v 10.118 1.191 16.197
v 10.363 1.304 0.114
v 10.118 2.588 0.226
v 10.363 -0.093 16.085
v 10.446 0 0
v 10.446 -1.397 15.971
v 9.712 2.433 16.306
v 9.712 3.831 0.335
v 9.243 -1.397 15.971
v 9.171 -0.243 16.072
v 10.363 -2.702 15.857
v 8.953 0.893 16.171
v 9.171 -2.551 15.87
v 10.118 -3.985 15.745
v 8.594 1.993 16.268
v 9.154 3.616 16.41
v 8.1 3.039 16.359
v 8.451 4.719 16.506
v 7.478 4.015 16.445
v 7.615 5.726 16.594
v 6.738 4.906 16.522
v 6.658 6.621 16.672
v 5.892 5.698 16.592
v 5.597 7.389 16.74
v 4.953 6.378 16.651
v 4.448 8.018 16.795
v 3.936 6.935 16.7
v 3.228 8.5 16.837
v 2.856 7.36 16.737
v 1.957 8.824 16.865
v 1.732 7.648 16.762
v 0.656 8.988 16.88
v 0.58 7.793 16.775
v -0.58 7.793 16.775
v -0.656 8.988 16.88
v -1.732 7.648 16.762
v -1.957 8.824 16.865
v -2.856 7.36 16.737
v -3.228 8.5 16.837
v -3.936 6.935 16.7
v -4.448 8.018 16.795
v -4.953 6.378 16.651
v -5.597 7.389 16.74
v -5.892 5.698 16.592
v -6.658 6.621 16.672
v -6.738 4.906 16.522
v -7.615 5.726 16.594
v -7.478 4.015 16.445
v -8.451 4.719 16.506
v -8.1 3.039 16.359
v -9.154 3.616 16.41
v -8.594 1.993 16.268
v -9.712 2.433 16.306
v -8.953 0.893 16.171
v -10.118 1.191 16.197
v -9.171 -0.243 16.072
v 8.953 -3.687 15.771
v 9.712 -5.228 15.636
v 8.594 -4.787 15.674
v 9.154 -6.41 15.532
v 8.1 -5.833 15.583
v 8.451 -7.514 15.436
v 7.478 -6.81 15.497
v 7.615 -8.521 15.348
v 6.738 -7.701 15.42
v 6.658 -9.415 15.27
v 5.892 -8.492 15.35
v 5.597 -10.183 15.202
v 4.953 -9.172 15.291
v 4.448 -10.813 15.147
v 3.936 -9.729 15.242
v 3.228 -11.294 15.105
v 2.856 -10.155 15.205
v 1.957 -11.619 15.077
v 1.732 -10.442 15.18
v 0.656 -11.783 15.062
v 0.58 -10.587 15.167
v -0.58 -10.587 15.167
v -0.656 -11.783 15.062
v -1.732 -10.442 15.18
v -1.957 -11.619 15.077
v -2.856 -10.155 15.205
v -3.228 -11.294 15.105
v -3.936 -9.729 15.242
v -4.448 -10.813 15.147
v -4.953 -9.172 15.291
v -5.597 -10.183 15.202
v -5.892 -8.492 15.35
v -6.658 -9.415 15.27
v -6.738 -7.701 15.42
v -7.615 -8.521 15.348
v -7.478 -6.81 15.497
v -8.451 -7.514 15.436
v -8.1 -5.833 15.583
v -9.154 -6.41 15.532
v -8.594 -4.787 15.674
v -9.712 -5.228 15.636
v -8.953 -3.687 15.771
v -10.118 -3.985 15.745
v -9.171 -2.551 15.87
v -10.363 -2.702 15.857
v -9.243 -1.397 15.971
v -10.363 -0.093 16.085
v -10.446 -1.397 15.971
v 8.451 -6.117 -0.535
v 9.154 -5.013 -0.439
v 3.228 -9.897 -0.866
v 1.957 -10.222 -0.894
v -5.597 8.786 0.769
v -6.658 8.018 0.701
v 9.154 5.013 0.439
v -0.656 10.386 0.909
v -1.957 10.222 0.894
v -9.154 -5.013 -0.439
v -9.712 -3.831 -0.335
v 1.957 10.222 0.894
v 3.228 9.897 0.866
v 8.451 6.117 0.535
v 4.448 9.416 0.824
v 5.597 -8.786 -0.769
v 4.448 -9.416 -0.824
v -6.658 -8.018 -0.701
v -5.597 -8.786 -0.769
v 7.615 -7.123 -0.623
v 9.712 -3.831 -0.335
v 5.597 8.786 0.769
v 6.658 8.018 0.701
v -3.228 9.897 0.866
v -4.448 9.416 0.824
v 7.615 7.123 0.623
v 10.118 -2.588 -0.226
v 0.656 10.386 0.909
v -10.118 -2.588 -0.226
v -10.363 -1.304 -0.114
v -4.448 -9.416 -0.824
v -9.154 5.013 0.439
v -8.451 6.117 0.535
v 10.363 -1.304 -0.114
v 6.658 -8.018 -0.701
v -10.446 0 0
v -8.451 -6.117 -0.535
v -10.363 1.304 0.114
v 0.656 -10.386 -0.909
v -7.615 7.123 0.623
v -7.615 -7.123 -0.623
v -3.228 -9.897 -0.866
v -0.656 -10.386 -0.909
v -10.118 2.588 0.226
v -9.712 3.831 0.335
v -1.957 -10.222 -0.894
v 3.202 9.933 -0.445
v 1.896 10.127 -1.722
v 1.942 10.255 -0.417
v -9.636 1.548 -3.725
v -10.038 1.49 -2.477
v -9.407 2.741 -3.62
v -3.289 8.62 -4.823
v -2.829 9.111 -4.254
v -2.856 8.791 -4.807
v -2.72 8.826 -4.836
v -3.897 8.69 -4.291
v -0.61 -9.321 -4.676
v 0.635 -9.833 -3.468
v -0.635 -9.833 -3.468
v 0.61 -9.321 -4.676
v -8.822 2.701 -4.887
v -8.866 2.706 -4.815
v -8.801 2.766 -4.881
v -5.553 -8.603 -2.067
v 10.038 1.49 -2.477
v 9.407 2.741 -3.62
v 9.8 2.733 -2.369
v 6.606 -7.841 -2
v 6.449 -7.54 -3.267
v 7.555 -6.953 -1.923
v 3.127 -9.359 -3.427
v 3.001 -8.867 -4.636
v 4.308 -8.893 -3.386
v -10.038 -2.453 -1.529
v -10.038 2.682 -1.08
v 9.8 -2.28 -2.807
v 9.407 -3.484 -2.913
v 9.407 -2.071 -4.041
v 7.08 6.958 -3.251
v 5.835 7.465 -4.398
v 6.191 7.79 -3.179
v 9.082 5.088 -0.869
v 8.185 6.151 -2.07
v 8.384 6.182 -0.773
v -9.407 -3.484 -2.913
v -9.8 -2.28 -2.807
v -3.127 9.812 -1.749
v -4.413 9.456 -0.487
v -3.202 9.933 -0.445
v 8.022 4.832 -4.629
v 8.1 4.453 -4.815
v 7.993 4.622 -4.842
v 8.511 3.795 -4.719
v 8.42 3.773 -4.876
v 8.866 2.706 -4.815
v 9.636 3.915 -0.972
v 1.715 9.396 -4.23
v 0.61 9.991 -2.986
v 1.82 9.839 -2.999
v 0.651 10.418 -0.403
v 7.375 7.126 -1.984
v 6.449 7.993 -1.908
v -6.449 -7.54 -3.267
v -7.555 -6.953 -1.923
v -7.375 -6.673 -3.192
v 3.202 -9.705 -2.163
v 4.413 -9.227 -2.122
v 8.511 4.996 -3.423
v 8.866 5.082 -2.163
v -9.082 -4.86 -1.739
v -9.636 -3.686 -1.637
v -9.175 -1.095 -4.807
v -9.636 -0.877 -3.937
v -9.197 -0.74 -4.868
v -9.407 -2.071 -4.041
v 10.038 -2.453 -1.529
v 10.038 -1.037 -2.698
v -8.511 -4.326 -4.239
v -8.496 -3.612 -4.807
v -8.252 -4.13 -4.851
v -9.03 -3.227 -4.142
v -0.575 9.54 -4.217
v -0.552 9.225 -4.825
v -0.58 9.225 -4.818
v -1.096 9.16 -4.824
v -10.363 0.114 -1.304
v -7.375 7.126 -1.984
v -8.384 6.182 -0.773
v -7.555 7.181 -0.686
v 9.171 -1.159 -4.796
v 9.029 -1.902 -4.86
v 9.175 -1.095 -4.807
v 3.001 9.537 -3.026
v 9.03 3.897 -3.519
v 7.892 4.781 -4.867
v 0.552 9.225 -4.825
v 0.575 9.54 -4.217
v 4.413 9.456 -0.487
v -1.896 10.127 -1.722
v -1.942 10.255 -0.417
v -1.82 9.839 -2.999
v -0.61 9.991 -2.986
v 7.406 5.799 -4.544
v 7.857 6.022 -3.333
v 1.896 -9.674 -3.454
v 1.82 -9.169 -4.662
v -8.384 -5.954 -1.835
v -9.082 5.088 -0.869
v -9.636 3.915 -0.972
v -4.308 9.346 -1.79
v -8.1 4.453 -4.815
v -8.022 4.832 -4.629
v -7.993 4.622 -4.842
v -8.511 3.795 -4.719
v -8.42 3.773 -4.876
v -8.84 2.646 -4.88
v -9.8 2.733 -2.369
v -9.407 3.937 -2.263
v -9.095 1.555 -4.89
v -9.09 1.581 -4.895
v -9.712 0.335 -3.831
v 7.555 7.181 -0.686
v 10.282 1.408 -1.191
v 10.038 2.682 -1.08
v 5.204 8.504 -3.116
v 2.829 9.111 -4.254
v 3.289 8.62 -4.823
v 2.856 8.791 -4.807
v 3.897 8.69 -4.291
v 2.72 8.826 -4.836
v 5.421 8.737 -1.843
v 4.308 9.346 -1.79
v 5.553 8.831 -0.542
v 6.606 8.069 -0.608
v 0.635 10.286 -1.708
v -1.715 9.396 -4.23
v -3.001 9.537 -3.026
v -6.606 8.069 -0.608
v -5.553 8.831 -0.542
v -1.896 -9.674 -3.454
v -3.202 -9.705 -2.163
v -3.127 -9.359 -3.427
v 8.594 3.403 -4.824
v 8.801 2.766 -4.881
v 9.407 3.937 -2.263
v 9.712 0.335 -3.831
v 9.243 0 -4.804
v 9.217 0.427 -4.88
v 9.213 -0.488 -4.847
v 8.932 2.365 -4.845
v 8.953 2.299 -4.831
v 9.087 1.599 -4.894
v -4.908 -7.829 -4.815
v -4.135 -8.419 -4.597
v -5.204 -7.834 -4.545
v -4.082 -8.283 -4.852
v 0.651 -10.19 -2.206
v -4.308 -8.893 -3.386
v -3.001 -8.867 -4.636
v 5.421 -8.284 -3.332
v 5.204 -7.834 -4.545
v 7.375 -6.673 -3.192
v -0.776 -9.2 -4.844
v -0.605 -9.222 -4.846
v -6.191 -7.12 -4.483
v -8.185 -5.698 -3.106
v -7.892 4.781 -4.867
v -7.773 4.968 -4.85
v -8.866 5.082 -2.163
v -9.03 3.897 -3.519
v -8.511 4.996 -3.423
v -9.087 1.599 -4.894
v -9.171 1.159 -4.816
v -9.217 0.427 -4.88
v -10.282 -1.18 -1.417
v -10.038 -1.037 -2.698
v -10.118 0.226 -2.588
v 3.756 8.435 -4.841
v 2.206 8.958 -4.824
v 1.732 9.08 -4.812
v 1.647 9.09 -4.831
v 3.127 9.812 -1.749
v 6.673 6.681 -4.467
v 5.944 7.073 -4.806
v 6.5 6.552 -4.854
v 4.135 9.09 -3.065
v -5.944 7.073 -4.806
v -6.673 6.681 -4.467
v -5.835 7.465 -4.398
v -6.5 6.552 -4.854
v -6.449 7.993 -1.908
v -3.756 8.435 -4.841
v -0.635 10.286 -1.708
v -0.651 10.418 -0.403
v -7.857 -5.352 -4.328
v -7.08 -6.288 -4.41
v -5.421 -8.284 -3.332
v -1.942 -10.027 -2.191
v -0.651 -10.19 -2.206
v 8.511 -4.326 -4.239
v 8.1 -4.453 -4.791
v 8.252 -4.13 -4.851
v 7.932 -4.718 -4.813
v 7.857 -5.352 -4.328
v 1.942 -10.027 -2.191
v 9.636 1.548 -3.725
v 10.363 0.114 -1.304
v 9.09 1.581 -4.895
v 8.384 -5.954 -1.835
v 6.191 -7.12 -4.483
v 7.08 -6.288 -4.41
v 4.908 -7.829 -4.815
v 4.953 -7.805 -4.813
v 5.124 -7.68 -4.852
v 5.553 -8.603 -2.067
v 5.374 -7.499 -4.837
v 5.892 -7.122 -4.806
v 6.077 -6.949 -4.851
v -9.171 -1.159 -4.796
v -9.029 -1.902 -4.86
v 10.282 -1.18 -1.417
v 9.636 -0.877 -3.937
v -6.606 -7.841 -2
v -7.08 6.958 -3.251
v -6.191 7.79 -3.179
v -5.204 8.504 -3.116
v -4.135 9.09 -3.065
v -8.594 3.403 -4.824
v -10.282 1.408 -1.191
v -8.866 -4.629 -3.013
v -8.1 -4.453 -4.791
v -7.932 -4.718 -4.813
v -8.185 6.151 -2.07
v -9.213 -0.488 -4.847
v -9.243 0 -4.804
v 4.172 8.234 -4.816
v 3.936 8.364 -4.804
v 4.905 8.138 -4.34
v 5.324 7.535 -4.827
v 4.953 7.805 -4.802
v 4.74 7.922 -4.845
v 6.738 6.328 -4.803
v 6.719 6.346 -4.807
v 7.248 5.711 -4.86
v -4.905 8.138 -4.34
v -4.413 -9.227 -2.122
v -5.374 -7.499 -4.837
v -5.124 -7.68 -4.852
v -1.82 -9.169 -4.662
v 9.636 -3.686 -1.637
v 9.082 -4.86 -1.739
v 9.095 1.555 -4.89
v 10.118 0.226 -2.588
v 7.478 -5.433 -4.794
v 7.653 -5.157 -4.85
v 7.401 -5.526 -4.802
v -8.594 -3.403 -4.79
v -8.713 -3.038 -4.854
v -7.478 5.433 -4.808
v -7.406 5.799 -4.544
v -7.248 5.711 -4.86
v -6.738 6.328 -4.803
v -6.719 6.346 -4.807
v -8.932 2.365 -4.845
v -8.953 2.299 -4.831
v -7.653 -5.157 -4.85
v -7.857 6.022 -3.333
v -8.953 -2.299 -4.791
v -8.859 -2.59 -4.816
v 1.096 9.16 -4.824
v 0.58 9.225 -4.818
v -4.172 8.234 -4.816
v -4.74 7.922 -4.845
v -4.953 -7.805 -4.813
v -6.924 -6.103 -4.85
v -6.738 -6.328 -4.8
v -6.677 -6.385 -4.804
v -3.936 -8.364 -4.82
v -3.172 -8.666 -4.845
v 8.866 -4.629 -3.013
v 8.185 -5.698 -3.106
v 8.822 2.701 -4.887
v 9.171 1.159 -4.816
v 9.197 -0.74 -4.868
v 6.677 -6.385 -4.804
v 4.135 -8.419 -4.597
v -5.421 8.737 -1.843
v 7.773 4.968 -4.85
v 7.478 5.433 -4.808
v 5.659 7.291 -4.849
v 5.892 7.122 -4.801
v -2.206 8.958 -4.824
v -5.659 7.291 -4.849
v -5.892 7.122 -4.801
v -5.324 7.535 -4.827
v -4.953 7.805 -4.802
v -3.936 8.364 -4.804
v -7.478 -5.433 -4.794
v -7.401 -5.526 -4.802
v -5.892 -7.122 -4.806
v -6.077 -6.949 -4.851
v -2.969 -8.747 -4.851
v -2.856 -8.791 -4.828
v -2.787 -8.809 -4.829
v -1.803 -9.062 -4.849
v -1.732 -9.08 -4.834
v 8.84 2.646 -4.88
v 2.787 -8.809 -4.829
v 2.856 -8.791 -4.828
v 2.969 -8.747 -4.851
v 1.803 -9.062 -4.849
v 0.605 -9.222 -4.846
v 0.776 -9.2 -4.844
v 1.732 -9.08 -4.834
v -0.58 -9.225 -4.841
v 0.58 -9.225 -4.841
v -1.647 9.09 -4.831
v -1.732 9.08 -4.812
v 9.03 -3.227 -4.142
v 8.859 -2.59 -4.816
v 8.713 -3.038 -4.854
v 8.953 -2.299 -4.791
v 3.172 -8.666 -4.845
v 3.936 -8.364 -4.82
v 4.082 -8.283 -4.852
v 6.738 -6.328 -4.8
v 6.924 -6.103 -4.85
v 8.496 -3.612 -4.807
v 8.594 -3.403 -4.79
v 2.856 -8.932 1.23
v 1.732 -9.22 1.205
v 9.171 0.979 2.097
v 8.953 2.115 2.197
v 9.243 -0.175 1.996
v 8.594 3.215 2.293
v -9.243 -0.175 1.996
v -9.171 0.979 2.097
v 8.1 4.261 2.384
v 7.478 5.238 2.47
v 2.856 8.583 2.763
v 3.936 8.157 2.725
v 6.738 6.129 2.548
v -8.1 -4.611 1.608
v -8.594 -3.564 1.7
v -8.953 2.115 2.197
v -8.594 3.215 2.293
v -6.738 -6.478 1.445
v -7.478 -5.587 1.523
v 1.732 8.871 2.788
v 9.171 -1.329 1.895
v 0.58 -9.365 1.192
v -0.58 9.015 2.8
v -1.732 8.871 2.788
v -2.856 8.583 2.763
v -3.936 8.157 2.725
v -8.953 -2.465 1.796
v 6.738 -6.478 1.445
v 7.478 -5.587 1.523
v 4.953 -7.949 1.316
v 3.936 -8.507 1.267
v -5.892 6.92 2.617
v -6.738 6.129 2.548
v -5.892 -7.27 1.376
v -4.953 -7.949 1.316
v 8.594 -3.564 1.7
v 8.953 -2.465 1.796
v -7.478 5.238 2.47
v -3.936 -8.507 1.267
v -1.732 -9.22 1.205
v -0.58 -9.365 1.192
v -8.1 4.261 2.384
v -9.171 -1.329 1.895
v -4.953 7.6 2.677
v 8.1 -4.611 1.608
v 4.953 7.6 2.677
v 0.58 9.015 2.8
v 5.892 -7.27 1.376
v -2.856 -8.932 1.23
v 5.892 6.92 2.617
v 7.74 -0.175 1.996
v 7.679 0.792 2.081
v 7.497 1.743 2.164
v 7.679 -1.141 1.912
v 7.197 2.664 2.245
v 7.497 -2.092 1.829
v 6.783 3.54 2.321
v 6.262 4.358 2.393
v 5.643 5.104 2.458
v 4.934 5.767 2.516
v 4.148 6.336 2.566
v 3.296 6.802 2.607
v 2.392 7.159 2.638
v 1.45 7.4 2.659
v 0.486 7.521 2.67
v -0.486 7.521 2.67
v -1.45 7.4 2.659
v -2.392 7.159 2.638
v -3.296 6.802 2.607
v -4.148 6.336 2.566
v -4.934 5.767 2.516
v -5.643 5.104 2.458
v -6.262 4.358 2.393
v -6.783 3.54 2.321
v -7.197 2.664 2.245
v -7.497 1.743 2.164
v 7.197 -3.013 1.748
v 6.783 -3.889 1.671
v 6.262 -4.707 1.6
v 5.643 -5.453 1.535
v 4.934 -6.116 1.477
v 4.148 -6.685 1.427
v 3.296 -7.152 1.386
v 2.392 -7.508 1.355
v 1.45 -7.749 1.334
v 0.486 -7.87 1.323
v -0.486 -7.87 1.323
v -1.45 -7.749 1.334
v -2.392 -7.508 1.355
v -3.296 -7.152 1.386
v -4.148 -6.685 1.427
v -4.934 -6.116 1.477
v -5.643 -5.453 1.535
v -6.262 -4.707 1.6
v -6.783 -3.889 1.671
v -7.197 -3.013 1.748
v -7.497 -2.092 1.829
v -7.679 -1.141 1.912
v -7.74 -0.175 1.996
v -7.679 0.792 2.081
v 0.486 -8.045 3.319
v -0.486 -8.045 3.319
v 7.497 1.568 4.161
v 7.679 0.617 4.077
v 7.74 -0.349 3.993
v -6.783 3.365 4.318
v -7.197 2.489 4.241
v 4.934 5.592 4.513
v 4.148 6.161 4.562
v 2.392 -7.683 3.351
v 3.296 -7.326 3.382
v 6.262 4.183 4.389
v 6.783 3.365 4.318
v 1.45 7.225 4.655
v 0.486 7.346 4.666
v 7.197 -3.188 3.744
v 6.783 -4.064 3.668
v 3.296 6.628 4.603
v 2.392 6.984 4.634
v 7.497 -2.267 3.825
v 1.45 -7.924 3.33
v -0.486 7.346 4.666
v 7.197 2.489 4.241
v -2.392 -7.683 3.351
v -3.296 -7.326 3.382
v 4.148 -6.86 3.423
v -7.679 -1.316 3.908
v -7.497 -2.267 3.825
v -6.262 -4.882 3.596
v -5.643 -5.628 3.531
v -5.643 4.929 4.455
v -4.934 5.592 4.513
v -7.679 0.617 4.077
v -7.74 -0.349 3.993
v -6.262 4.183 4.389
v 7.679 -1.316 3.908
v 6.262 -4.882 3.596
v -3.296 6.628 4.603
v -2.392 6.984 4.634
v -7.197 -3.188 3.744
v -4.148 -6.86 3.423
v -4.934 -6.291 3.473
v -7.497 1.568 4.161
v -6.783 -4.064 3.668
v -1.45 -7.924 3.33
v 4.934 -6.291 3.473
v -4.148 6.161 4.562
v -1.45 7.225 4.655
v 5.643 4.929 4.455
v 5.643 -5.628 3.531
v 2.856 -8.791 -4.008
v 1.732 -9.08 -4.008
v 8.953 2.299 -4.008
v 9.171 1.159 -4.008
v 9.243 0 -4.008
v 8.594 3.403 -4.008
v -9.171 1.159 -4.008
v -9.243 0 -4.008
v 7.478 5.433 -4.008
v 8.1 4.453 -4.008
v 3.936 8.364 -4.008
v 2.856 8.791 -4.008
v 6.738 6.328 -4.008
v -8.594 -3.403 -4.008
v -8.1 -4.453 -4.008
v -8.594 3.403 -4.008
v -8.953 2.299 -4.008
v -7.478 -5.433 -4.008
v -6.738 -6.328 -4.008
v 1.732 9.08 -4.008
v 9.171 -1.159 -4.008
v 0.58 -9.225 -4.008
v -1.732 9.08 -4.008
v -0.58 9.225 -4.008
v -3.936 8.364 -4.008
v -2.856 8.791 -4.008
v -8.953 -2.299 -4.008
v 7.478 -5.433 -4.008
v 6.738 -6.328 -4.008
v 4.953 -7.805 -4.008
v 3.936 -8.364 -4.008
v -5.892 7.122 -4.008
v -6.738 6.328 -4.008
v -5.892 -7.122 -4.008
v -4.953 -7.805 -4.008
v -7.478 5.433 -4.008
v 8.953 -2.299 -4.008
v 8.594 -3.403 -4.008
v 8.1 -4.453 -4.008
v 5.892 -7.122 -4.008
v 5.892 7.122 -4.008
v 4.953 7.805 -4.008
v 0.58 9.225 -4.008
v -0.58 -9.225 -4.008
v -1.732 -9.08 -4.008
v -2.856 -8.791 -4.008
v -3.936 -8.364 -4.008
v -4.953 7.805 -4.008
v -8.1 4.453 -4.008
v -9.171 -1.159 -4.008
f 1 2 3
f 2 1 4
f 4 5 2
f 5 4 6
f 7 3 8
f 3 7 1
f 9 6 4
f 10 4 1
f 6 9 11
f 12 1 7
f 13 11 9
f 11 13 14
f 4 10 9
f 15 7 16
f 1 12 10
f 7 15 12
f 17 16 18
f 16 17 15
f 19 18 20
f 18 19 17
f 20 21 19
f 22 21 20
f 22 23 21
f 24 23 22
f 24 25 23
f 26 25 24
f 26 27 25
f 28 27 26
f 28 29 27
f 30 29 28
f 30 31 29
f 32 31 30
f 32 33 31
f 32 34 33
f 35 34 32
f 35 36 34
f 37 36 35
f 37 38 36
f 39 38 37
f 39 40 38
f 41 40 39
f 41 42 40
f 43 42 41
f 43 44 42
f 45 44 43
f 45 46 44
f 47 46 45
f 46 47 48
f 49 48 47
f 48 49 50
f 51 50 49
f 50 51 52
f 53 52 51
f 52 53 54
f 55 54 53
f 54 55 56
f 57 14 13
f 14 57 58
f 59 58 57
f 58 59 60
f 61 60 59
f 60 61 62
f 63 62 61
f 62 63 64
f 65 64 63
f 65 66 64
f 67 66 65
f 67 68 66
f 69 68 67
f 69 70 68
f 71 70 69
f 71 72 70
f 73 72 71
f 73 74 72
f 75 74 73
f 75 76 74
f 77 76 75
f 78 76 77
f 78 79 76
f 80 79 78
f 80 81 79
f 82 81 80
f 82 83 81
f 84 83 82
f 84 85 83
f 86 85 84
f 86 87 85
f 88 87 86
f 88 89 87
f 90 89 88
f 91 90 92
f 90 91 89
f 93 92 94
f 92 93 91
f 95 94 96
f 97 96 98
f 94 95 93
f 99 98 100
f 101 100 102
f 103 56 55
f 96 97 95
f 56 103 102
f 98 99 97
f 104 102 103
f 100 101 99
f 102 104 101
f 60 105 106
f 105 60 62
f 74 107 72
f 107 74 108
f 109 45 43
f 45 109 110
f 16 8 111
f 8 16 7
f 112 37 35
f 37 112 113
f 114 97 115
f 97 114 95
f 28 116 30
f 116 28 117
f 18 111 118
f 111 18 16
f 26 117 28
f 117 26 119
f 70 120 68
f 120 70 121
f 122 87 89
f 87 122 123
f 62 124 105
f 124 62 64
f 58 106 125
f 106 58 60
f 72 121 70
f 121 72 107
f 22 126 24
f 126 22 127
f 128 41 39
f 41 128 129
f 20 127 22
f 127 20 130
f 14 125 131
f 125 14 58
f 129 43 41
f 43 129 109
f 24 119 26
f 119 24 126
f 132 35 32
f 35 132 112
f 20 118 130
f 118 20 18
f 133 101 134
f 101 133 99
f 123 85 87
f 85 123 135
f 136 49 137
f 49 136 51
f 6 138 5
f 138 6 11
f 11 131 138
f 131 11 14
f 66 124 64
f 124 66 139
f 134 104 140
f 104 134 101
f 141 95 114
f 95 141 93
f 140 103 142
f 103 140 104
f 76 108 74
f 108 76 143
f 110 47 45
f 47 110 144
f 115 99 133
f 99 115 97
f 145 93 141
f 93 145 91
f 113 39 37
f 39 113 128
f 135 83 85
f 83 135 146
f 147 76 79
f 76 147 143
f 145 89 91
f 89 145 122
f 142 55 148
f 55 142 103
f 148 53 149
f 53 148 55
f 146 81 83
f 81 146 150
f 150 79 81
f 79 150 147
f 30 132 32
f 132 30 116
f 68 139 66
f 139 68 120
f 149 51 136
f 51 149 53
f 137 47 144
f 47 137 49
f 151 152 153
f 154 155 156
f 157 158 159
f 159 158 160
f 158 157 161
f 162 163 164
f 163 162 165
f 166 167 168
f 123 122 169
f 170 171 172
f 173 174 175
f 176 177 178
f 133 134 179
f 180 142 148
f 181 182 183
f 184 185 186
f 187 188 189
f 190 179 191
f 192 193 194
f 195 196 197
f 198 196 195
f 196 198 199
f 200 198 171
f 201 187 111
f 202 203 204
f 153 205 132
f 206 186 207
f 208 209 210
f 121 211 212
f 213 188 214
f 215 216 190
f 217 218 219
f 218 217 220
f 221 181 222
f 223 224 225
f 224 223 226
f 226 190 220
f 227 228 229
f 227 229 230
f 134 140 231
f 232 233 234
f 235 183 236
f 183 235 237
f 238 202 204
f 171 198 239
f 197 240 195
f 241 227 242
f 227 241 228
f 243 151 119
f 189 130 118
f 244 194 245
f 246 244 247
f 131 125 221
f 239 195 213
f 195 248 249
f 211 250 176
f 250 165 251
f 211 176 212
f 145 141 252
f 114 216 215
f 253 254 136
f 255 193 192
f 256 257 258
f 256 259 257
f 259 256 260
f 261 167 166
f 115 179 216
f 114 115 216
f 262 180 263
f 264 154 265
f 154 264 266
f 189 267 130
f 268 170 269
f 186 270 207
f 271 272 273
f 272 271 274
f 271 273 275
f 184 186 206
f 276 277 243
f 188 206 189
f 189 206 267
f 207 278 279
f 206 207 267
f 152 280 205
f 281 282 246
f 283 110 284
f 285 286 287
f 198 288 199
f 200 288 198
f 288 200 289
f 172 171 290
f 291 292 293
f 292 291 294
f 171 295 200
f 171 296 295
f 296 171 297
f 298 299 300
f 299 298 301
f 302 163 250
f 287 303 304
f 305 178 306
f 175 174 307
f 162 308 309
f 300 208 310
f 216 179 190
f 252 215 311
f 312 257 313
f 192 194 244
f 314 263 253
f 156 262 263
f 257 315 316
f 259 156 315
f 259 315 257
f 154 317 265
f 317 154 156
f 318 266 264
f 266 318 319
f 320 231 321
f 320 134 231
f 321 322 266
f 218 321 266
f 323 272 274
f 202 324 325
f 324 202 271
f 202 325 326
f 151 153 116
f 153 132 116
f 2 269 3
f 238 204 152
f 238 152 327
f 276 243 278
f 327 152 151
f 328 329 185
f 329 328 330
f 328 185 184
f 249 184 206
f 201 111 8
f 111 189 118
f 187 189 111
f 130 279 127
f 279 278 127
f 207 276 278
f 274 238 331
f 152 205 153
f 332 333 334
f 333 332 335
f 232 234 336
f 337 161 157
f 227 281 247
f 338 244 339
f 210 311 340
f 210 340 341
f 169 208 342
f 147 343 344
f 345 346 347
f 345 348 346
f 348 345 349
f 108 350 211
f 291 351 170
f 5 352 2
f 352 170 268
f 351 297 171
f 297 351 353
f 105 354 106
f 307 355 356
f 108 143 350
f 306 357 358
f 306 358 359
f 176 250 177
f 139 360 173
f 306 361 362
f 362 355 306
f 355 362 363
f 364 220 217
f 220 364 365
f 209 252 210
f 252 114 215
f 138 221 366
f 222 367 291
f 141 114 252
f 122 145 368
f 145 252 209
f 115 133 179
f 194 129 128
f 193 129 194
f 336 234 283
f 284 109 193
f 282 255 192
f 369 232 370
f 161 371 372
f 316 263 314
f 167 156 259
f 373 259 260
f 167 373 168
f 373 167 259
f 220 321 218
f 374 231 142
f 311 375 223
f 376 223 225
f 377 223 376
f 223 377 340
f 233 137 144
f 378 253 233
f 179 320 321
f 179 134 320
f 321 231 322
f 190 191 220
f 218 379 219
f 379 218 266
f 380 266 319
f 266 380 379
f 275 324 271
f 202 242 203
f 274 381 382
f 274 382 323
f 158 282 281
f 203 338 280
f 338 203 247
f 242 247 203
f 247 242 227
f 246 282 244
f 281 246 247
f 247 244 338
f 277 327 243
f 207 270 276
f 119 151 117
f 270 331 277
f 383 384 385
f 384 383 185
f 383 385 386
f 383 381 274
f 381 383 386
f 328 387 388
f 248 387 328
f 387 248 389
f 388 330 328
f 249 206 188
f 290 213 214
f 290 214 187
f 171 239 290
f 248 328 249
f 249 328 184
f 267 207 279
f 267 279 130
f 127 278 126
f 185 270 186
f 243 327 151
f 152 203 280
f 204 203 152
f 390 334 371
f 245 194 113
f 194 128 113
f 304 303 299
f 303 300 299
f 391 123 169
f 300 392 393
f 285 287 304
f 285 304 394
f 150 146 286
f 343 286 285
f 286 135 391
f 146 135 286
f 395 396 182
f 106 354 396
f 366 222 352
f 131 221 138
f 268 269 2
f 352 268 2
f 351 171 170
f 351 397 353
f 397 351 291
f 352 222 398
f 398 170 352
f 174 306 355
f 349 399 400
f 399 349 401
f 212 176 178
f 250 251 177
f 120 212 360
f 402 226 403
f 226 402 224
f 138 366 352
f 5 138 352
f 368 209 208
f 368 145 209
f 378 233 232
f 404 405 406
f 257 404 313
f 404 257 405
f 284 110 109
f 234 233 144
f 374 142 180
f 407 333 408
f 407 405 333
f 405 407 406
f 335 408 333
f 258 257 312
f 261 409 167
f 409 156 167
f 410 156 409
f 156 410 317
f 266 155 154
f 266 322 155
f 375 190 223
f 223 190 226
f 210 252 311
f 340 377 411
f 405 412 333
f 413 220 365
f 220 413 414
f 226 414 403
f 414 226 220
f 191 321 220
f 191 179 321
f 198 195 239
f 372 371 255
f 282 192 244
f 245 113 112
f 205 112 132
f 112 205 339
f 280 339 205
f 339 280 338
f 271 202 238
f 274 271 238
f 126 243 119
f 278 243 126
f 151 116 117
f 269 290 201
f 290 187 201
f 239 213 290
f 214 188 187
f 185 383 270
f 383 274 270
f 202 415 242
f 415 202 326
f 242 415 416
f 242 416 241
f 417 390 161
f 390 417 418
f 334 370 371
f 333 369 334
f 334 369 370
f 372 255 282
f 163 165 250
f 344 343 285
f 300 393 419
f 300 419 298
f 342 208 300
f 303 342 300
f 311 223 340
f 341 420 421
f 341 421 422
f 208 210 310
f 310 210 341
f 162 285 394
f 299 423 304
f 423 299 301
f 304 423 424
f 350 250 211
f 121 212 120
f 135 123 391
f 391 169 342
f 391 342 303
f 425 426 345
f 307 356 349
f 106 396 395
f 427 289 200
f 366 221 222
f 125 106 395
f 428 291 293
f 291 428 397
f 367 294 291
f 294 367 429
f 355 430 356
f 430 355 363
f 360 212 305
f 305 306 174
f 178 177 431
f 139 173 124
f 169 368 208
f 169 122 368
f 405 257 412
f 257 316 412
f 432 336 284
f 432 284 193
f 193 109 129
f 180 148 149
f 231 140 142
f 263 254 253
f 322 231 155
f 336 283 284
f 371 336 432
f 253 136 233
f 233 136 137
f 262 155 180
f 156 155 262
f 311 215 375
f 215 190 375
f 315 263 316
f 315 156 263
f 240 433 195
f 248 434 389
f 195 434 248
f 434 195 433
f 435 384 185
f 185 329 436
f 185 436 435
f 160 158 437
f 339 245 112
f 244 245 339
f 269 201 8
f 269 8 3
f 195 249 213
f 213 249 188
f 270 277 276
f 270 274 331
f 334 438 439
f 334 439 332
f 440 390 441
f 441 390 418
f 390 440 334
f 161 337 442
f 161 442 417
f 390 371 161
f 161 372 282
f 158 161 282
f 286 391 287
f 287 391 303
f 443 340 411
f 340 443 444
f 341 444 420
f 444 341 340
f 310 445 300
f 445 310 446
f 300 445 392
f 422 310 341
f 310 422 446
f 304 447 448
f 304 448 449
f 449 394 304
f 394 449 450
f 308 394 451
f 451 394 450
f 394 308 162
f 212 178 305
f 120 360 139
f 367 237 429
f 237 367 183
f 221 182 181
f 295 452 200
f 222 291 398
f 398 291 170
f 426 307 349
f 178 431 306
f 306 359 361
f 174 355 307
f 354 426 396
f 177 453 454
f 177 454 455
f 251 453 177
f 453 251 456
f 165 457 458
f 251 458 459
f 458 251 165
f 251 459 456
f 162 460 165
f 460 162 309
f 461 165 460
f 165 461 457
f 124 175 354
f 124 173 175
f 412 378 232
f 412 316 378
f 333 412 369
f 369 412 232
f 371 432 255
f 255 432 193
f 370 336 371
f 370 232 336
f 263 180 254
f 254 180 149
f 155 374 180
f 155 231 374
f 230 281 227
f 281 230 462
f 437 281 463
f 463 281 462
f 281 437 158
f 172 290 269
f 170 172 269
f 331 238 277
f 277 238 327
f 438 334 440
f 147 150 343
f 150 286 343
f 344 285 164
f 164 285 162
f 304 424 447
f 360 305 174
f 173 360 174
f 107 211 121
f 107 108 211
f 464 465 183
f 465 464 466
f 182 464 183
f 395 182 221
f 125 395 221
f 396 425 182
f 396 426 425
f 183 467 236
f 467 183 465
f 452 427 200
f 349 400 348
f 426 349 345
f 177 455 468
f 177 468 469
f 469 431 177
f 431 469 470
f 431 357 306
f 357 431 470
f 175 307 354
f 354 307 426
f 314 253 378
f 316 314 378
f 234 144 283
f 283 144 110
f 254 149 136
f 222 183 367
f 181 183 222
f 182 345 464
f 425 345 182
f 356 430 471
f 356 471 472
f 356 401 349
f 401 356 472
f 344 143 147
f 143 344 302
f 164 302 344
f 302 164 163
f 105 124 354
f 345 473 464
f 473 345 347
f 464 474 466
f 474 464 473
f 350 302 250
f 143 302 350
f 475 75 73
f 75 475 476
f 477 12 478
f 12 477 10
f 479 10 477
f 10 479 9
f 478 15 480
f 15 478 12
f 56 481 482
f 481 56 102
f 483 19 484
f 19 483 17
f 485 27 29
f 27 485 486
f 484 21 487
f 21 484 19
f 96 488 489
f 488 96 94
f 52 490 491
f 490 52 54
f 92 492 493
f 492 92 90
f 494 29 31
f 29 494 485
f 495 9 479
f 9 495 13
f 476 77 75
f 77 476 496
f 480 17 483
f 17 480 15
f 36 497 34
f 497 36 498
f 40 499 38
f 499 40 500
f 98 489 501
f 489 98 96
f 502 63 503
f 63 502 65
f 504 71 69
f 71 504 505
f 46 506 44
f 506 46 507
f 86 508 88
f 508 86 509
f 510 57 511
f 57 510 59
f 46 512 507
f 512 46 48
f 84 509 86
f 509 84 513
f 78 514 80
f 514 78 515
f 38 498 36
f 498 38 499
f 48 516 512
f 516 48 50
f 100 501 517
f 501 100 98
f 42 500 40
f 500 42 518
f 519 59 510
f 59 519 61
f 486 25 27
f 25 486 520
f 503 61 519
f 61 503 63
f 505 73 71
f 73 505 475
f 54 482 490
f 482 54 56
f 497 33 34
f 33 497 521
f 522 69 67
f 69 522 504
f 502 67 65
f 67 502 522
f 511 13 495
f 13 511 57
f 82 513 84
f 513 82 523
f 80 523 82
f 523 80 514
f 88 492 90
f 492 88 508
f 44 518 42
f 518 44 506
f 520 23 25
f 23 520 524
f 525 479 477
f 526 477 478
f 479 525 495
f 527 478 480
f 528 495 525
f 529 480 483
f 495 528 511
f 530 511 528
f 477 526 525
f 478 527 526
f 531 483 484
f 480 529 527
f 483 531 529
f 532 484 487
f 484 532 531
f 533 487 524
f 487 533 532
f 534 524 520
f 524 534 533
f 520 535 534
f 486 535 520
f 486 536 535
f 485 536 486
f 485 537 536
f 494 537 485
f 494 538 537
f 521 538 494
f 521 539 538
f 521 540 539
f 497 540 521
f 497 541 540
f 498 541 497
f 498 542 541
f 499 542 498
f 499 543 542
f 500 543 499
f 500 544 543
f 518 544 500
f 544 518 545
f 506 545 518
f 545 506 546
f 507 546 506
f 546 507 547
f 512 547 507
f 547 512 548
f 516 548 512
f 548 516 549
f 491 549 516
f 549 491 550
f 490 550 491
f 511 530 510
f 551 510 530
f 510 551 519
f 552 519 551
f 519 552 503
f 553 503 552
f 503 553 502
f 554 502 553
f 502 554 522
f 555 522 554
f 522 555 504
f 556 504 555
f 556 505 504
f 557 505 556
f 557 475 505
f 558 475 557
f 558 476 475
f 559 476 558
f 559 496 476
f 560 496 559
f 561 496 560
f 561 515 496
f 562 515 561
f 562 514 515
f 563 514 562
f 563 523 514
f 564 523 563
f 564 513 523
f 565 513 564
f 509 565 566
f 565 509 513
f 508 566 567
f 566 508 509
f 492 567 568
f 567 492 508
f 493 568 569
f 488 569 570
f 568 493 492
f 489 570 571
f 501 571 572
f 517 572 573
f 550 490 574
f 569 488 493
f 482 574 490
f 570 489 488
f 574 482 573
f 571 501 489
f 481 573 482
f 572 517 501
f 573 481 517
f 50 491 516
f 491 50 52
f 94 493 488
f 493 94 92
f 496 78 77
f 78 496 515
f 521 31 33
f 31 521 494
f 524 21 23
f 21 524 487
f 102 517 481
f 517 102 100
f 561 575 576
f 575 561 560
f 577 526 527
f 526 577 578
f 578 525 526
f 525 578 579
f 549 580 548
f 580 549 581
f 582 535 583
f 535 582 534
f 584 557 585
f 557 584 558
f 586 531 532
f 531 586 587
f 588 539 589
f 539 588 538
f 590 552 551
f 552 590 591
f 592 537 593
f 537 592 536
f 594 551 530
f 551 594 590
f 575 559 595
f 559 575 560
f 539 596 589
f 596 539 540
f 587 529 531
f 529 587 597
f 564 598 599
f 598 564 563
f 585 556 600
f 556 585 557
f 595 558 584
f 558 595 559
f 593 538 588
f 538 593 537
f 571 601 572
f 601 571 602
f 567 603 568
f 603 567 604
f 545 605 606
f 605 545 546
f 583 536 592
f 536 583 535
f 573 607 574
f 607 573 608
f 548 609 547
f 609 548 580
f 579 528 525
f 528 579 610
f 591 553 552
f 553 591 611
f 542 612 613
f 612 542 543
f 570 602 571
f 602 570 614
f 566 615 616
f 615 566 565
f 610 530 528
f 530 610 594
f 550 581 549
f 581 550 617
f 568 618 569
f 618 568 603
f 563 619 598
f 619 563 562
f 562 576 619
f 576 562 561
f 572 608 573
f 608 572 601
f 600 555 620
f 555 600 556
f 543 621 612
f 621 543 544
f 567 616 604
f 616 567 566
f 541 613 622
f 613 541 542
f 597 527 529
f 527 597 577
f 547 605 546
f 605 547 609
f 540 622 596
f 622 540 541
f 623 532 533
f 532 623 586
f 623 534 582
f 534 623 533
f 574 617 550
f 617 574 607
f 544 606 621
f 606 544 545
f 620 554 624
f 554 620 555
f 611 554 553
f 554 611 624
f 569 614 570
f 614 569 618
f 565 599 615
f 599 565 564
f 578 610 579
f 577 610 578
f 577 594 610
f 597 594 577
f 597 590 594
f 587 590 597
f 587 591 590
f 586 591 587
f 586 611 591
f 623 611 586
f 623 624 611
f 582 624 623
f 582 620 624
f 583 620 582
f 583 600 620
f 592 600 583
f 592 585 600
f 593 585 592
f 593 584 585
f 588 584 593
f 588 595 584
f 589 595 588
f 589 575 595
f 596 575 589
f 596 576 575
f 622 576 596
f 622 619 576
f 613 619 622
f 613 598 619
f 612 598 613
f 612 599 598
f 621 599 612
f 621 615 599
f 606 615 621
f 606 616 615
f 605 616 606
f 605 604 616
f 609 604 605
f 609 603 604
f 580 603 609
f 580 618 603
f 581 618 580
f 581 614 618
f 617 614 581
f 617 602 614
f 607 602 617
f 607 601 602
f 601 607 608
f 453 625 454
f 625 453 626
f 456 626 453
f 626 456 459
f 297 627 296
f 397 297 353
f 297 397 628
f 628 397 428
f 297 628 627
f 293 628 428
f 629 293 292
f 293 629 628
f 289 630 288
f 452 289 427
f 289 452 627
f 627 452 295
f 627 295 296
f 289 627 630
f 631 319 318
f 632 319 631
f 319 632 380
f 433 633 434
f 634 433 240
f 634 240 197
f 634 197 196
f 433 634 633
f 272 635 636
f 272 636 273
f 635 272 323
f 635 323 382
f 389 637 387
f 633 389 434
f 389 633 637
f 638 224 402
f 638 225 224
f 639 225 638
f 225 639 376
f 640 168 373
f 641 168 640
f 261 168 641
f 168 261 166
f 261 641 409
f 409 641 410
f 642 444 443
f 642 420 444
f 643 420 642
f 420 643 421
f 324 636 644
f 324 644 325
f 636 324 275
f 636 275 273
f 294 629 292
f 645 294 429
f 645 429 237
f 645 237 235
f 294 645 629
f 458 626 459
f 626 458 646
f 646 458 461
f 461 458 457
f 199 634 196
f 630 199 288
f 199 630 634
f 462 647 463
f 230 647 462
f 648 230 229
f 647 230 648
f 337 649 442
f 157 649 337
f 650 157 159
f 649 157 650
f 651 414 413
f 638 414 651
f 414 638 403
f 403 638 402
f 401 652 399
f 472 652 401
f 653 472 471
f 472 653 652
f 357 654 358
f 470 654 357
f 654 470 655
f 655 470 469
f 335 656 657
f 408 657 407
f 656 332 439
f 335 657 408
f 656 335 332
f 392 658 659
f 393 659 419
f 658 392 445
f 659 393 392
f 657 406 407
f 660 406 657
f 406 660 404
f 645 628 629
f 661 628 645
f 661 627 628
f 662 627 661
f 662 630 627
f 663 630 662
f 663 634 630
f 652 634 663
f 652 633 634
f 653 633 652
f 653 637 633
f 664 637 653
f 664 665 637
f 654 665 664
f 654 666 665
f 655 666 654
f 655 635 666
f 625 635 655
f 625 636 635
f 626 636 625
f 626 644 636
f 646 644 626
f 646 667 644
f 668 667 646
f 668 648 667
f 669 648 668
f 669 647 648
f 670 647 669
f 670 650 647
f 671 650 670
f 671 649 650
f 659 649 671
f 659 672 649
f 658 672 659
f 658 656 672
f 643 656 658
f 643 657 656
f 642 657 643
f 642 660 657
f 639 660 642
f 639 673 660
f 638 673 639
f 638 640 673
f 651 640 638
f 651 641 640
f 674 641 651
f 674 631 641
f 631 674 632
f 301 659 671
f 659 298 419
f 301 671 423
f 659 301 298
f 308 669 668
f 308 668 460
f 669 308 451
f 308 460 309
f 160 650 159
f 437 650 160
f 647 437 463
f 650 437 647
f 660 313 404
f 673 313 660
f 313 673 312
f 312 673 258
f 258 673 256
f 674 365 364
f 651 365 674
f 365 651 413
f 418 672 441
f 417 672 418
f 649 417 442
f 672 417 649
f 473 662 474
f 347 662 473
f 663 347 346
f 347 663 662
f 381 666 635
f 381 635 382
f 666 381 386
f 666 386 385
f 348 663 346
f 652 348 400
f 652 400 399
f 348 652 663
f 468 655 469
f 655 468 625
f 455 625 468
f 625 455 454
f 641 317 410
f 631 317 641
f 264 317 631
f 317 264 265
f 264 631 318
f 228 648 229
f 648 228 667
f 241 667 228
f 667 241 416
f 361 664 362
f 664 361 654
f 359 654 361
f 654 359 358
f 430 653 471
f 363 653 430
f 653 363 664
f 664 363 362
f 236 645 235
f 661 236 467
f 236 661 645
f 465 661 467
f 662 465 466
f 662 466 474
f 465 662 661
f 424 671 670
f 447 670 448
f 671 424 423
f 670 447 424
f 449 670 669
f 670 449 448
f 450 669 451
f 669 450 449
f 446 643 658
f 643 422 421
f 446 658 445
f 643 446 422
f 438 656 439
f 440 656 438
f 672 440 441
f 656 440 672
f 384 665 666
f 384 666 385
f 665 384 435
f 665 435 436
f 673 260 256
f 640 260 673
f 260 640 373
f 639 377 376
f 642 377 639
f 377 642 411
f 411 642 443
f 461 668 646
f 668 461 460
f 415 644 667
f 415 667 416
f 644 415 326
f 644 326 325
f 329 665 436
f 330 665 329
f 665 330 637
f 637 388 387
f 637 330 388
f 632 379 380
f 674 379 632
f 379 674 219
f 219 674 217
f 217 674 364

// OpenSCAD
$fn = 50;
$fs=1.75/4;

// Scaling factor to compensate shrinkage characteristic of used filament
scale_for_filament = 1.002; // PETG 0.002% shrink

// Outer diameter of the foot in mm
outer_diameter = 18.45;

// Inner diameter of the foot in mm
inner_diameter = 15.65;

// Wall thickness in mm; choose a multiple of the filament width
foot_thickness = 1.2;

// angle of rotation around X axis in degrees
table_leg_angle = 5;

// preview[view:south east, tilt:top]

module table_foot()
{
  difference()
  {
    rotate([table_leg_angle,0,0])
    difference()
    {
      union()
      {
        cylinder(d=outer_diameter + 2 * foot_thickness,h = 16);
        sphere(d=outer_diameter + 2 * foot_thickness);
      }
      translate([0, 0, 2])
      difference()
      {
        cylinder(d=outer_diameter,h=15);
        cylinder(d=inner_diameter - 0.2,h=16);
      }
      translate([0, 0, 4]) cylinder(d=outer_diameter,h=13);
    }
    translate([0, 0, -4 - 15]) cylinder(d=outer_diameter,h=15);
  }
}

scale(scale_for_filament) table_foot();
